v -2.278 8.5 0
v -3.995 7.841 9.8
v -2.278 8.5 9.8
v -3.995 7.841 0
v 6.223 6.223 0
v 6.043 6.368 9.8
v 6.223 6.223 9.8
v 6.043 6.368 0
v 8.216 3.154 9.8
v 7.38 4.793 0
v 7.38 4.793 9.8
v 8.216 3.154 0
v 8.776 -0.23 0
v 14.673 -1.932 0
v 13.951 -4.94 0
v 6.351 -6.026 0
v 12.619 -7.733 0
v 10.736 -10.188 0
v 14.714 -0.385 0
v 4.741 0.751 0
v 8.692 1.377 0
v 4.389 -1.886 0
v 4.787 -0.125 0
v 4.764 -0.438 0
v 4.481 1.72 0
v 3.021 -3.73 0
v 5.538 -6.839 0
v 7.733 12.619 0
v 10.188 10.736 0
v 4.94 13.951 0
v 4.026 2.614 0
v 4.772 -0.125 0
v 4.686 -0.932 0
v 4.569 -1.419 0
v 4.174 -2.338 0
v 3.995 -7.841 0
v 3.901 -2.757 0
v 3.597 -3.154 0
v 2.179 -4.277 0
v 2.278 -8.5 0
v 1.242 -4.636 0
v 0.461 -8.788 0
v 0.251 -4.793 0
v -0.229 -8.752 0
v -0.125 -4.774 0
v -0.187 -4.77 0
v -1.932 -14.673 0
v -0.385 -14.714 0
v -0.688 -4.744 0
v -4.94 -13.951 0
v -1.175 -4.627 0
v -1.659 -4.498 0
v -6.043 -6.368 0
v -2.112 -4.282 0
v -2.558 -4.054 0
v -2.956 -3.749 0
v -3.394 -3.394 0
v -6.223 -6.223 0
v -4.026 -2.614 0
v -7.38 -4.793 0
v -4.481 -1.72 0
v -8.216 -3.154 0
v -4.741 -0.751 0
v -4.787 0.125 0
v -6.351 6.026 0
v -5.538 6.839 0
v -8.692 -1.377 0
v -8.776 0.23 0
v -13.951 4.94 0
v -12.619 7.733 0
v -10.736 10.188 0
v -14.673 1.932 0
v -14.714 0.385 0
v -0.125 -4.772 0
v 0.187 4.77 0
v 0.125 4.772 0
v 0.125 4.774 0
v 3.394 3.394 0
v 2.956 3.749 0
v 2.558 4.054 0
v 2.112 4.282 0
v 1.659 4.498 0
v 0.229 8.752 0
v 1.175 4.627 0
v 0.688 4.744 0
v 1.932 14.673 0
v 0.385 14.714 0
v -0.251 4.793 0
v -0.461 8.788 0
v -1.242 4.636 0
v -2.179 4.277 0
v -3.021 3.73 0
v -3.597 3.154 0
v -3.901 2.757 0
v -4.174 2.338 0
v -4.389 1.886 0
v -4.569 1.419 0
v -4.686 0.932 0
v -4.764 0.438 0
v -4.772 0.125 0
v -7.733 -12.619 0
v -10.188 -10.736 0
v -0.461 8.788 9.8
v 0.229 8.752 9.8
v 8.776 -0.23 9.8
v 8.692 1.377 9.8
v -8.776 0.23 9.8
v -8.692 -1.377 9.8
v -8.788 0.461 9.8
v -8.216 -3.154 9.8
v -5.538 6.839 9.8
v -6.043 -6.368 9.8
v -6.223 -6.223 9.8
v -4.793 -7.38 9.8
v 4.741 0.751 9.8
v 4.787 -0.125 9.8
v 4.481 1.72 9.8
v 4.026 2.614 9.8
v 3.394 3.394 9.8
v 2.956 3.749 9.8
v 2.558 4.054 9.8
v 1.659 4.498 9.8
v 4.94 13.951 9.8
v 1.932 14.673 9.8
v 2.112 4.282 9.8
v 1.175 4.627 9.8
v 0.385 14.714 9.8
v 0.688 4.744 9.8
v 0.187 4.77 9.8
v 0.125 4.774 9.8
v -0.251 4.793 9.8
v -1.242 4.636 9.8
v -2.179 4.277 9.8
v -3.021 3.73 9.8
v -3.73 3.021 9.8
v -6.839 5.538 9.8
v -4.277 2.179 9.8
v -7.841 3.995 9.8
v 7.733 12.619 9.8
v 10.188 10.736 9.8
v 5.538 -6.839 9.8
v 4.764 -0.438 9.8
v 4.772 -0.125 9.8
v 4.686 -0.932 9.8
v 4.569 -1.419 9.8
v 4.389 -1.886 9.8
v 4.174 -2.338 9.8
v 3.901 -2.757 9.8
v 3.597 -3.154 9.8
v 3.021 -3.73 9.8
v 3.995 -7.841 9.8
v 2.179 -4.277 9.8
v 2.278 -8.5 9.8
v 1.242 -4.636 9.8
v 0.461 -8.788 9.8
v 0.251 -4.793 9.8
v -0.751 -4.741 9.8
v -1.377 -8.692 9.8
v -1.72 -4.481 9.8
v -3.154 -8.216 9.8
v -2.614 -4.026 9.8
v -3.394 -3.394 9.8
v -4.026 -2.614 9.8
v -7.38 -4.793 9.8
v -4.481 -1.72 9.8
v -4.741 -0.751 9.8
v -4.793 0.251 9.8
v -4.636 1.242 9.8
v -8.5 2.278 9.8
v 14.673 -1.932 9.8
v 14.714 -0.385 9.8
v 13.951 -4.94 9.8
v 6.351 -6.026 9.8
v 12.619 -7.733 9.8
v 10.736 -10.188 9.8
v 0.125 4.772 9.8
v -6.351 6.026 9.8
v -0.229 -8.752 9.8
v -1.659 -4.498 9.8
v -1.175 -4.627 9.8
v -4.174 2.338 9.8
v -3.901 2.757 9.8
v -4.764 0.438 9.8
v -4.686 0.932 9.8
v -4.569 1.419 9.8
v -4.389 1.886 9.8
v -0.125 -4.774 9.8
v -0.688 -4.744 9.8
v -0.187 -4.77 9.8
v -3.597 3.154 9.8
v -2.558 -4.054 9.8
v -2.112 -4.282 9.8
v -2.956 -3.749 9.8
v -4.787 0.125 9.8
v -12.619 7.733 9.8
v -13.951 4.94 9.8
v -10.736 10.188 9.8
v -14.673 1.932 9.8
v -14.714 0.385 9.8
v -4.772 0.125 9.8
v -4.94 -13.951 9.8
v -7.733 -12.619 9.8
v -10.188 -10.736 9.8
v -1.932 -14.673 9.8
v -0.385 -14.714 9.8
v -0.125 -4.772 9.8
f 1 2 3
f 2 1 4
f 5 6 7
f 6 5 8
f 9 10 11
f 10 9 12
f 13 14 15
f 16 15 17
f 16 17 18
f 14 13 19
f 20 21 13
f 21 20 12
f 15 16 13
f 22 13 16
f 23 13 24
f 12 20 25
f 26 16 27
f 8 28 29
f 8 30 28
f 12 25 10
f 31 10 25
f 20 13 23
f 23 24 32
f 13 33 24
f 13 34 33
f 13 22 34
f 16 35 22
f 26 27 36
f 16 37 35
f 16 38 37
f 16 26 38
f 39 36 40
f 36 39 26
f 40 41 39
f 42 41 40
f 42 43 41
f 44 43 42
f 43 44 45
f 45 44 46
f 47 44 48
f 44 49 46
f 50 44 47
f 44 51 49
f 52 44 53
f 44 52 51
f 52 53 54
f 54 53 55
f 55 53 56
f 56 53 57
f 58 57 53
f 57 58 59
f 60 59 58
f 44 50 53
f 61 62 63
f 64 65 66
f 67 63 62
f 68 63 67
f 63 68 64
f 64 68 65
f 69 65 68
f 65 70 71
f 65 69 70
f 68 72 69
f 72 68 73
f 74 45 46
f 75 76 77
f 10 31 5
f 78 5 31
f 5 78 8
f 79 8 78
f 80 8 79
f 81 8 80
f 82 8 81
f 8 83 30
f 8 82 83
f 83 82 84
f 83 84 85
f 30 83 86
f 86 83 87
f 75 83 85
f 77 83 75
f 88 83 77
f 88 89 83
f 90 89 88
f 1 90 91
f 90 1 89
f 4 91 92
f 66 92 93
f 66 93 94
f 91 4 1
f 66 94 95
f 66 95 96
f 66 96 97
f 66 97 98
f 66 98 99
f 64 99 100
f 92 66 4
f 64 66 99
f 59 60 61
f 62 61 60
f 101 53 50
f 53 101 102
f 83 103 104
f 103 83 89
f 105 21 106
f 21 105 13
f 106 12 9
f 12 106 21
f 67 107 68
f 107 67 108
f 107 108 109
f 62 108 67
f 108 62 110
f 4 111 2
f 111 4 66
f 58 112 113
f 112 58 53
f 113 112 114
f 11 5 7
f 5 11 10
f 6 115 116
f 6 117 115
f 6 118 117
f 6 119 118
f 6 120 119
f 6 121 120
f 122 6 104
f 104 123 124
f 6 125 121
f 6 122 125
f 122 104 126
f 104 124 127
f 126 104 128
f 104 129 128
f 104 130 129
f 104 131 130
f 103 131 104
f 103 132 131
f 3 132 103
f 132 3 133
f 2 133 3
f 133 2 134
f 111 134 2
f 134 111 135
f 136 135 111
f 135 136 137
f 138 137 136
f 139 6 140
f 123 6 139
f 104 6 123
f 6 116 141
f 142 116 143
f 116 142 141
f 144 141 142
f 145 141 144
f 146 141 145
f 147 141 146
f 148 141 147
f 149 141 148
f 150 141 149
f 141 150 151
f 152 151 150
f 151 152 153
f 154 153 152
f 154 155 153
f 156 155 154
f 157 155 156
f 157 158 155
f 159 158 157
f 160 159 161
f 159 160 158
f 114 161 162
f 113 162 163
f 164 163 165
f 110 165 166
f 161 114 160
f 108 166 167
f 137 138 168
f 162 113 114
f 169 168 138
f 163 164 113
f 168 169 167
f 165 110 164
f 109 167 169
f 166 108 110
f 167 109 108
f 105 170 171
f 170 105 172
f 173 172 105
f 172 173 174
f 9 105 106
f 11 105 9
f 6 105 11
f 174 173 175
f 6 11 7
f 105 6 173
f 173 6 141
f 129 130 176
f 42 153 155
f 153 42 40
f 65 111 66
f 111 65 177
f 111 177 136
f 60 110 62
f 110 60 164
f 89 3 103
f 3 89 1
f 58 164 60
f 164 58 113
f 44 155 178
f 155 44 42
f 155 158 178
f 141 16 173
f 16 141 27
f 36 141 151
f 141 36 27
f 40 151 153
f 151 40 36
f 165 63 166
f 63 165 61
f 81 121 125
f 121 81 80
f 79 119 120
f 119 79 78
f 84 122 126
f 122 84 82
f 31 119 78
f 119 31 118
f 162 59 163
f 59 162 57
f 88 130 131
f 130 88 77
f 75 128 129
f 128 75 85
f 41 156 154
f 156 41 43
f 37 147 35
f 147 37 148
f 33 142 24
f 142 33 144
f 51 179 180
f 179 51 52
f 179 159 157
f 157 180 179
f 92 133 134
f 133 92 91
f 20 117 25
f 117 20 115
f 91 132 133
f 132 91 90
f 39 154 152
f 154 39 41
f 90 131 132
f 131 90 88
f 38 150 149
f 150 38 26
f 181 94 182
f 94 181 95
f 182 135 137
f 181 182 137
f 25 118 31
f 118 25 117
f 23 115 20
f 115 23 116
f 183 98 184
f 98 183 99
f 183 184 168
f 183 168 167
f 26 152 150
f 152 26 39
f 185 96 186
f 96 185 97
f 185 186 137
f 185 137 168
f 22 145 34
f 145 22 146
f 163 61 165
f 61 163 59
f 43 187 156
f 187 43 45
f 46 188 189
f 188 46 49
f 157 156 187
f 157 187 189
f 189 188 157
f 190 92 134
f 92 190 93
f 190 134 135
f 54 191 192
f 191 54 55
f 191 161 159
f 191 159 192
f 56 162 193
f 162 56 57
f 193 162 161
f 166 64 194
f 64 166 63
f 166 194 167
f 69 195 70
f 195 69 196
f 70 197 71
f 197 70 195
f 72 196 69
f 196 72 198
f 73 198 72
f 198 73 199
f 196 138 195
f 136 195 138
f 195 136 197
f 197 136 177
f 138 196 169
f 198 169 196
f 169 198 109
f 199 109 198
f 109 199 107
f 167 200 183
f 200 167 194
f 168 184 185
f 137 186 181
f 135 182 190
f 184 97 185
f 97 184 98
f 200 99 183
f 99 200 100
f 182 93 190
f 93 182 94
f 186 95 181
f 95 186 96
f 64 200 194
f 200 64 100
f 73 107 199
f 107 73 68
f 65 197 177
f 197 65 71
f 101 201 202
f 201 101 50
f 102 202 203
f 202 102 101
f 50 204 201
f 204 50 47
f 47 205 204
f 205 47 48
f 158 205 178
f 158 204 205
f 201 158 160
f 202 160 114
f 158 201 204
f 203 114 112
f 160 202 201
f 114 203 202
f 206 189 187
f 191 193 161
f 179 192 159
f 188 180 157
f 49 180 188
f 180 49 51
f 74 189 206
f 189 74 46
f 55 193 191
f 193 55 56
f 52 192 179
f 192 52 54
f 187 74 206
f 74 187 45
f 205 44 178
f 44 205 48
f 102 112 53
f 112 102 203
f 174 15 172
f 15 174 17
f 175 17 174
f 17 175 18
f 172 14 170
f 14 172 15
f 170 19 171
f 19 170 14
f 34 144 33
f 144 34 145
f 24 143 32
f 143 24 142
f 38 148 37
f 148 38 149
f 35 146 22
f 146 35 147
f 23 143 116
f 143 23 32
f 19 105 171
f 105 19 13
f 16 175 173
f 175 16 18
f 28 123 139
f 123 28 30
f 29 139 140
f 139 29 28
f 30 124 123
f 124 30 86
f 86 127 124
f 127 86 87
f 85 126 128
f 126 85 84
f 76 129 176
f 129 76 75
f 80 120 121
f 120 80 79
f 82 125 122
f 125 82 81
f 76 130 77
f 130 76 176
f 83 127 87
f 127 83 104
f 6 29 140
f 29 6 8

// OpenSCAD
// Spider Coupling
// Simon Kirkby
// tigger@interthingy.com
// 201005301120

// modes 
// 0 - displays assembled coupling 
// 1 - coupling layed out for printing , single stl
// 2 - just coupling
// 3 - just spider
$fs = 0.01;
            
mode = 3;

// display 

lift = 0.01; // explodes the coupling in mode 0 , 0.0 assembled , 2.0 exploded

// variables

// wheel

wheel_radius = 15; // external radius of entire coupling
wheel_height = 25; // height of the base
shaft_size = 10.5; // shaft size 
shaft_size2 = 10; // shaft size of second wheel. ONLY USED IN MODE 0 AND 1

//coupling

coupling_height =10; // height of the struts 
coupling_thickness = 6; // wall thickness of struts
coupling_struts = 2; // number of struts
spider_angle = 90; // combined angle of the spider arms
 
clearance = 0.2; // linear clearance of the spider
radial_clearance = 3; // radial clearance in degrees at each spider arm

//spider

spider_wall_thickness = 4; // thickness of the spider hub



module spider_leg()
{	
	inc = 360/(2*coupling_struts);
	intersection()
	{
		difference()
		{
			cylinder(coupling_height-clearance,r=wheel_radius-clearance);
			translate([0,0,-(clearance/2)])
			cylinder(coupling_height+2*clearance,r=wheel_radius-coupling_thickness-clearance-spider_wall_thickness);
		}			
		intersection()
		{
			rotate(-90,[0,0,1])
			rotate((spider_angle/coupling_struts)-radial_clearance,[0,0,1])
			cube(size=wheel_radius*5);
			cube(size=wheel_radius*5);			
		}
	}
}

module spider()
{
	inc = 360/(2*coupling_struts);
	color([1,0,0])
	{
	rotate(inc-(spider_angle/coupling_struts),[0,0,1])
	union()
	{
		difference()
		{
			cylinder(coupling_height-clearance,r=wheel_radius-coupling_thickness-clearance);
			translate([0,0,-(clearance/2)])
			cylinder(coupling_height+clearance,r=wheel_radius-coupling_thickness-clearance-spider_wall_thickness);
		}
		for ( z = [1:(coupling_struts*2)])
			{	
				rotate((z*inc)+(radial_clearance/2),[0,0,1])		
				spider_leg();
			}
		}
	}
}

module strut()
{
	inc = 360/(2*coupling_struts);
	intersection()
	{
		difference()
		{
			cylinder(coupling_height,r=wheel_radius);
			translate([0,0,-(0.1+coupling_height/2)])
			cylinder(coupling_height*2+0.1,r=wheel_radius-coupling_thickness);
		}
		intersection()
		{
			rotate(-90,[0,0,1])
			rotate(inc-(spider_angle/coupling_struts),[0,0,1])
			cube(size=wheel_radius*5);
			cube(size=wheel_radius*5);			
		}
	}
}

module struts()
{
	inc = 360/coupling_struts;
	for ( z = [1:coupling_struts])
	{	
		rotate(z*inc,[0,0,1])		
		strut();
	}
}

module shaft(sr)
{
		cylinder(wheel_height*7,r1=sr,r2=sr,center=true);
}

module wheel(r)
{	
	difference()
	{
		union(){
			cylinder(wheel_height,r1=r,r2=r,center=true);
		}
		shaft(sr=shaft_size/2.0);
	}
}

module wheel2(r)
{	
	difference()
	{
		union(){
			cylinder(wheel_height,r1=r,r2=r,center=true);
		}
		shaft(sr=shaft_size2/2.0);
	}
}

module spider_coupling()
{
	translate([0,0,wheel_height/2])
	union()
	{
		wheel(r=wheel_radius);
		translate([0,0,wheel_height/2])
		struts();
	}
}

module spider_coupling2()
{
	translate([0,0,wheel_height/2])
	union()
	{
		wheel2(r=wheel_radius);
		translate([0,0,wheel_height/2])
		struts();
	}
}
module inverted_spider_coupling()
{
	mirror([0,0,1])
	translate([0,0,-(2*wheel_height+(2*lift+1)*coupling_height)])
	rotate((180/coupling_struts),[0,0,1])
	spider_coupling2();
}

module placed_spider()
{
	translate([0,0,wheel_height+lift*coupling_height+(clearance/2)])
	color([1,0,0])
	{
		spider();
	}
}

module display()
{
	spider_coupling();
	placed_spider();
	inverted_spider_coupling();
}

// modal display
if ( mode == 0)
{
	display(); 
}

if (mode == 1)
{
	translate([-wheel_radius,-1.1*wheel_radius,0])
	spider_coupling();
	translate([-wheel_radius,1.1*wheel_radius,0])
	spider_coupling2();
	translate([wheel_radius,0,0])
	spider();
}

if (mode == 2)
{   
	difference(){
        spider_coupling();
        translate ([0,(wheel_radius/2),wheel_height-((3.5/2)+(wheel_height/4))]){
            cube([5.5, 2.5, 3.5+wheel_height/2], center=true);
        }
        translate([0,wheel_radius/2,wheel_height/2]){
            rotate(90,[1,0,0])
            cylinder(h=wheel_radius, d=3.2, center=true);
            }
        }
        
        
    
}

if (mode == 3)
{
	spider();
}
